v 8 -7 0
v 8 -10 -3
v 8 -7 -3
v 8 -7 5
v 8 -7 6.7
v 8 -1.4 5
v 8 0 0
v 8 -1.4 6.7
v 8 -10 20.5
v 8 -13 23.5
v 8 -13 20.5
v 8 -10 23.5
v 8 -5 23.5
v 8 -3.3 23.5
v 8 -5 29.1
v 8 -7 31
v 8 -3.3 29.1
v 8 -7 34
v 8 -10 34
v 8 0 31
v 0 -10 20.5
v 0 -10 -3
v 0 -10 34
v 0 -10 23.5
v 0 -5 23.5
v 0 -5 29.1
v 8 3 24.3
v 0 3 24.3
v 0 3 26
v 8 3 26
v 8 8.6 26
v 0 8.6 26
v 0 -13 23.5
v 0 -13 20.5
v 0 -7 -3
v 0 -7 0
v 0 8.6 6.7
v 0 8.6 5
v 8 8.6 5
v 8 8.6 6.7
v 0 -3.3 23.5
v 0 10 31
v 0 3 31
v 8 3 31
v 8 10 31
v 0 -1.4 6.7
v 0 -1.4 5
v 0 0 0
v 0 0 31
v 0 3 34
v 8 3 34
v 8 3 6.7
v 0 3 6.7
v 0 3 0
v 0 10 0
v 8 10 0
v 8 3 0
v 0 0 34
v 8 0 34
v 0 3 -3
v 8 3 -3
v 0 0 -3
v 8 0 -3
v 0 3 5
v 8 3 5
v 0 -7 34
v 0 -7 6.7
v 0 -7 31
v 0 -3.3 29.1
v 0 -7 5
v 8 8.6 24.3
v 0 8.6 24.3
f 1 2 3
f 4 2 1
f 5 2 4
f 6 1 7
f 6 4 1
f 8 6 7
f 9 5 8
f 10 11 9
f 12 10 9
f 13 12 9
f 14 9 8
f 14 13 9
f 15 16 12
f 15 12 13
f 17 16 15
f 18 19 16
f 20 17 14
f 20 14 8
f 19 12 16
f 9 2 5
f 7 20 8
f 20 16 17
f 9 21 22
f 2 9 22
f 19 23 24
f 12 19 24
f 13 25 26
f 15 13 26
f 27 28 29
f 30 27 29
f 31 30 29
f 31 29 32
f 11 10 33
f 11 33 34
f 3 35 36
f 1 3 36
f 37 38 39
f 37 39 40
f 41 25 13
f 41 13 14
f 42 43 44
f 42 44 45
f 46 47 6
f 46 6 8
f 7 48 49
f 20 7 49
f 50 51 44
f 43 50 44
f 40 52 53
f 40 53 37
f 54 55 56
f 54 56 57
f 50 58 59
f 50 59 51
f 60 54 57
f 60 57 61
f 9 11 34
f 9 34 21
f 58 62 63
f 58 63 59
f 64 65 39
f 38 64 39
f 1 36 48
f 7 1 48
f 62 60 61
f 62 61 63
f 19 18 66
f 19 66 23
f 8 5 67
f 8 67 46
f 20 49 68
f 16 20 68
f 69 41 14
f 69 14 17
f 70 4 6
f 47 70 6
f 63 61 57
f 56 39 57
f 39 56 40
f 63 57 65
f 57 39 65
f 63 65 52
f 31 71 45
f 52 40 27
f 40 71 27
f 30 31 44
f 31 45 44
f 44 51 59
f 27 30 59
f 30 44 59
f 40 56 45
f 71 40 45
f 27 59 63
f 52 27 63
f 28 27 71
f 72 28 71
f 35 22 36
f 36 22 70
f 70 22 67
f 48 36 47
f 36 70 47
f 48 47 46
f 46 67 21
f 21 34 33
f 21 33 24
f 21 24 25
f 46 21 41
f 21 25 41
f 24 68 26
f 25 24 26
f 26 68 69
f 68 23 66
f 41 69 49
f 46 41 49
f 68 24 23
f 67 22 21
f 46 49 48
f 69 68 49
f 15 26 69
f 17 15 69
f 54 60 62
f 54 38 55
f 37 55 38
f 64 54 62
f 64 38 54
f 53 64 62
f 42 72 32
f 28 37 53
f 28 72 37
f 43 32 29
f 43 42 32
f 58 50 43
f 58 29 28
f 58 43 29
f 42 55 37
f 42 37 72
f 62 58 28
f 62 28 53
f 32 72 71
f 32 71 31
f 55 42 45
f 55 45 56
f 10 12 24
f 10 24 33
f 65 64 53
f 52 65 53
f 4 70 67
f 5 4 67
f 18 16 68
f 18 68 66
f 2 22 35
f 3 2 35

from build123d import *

# Parameters (mm, degrees)
SKETCH_W     = 5.6
SKETCH_H     = 1.7
SKETCH_W_2   = 1.7
SKETCH_H_2   = 5.6
PAD_DEPTH    = 8
SKETCH001_W  = 5.6
SKETCH001_H  = 1.7
PAD001_DEPTH = 8


with BuildPart() as bottomholder:
    # Sketch → Pad (new body)
    with BuildSketch(Plane.YZ):
        Polygon((-10, 34), (-10, 23.5), (-13, 23.5), (-13, 20.5), (-10, 20.5), (-10, -3), (-7, -3), (-7, 0), (0, 0), (0, 31), (-7, 31), (-7, 34), align=None)
        with Locations((-4.2, 5.85)):
            Rectangle(SKETCH_W, SKETCH_H, mode=Mode.SUBTRACT)
        with Locations((-4.15, 26.3)):
            Rectangle(SKETCH_W_2, SKETCH_H_2, mode=Mode.SUBTRACT)
    extrude(amount=PAD_DEPTH)


with BuildPart() as topholder:
    # Sketch001 → Pad001 (new body)
    with BuildSketch(Plane.YZ):
        Polygon((0, 34), (3, 34), (3, 31), (10, 31), (10, 0), (3, 0), (3, -3), (0, -3), align=None)
        with Locations((5.8, 25.15)):
            Rectangle(SKETCH001_W, SKETCH001_H, mode=Mode.SUBTRACT)
        with Locations((5.8, 5.85)):
            Rectangle(SKETCH001_W, SKETCH001_H, mode=Mode.SUBTRACT)
    extrude(amount=PAD001_DEPTH)


solid = Compound([bottomholder.part, topholder.part])
